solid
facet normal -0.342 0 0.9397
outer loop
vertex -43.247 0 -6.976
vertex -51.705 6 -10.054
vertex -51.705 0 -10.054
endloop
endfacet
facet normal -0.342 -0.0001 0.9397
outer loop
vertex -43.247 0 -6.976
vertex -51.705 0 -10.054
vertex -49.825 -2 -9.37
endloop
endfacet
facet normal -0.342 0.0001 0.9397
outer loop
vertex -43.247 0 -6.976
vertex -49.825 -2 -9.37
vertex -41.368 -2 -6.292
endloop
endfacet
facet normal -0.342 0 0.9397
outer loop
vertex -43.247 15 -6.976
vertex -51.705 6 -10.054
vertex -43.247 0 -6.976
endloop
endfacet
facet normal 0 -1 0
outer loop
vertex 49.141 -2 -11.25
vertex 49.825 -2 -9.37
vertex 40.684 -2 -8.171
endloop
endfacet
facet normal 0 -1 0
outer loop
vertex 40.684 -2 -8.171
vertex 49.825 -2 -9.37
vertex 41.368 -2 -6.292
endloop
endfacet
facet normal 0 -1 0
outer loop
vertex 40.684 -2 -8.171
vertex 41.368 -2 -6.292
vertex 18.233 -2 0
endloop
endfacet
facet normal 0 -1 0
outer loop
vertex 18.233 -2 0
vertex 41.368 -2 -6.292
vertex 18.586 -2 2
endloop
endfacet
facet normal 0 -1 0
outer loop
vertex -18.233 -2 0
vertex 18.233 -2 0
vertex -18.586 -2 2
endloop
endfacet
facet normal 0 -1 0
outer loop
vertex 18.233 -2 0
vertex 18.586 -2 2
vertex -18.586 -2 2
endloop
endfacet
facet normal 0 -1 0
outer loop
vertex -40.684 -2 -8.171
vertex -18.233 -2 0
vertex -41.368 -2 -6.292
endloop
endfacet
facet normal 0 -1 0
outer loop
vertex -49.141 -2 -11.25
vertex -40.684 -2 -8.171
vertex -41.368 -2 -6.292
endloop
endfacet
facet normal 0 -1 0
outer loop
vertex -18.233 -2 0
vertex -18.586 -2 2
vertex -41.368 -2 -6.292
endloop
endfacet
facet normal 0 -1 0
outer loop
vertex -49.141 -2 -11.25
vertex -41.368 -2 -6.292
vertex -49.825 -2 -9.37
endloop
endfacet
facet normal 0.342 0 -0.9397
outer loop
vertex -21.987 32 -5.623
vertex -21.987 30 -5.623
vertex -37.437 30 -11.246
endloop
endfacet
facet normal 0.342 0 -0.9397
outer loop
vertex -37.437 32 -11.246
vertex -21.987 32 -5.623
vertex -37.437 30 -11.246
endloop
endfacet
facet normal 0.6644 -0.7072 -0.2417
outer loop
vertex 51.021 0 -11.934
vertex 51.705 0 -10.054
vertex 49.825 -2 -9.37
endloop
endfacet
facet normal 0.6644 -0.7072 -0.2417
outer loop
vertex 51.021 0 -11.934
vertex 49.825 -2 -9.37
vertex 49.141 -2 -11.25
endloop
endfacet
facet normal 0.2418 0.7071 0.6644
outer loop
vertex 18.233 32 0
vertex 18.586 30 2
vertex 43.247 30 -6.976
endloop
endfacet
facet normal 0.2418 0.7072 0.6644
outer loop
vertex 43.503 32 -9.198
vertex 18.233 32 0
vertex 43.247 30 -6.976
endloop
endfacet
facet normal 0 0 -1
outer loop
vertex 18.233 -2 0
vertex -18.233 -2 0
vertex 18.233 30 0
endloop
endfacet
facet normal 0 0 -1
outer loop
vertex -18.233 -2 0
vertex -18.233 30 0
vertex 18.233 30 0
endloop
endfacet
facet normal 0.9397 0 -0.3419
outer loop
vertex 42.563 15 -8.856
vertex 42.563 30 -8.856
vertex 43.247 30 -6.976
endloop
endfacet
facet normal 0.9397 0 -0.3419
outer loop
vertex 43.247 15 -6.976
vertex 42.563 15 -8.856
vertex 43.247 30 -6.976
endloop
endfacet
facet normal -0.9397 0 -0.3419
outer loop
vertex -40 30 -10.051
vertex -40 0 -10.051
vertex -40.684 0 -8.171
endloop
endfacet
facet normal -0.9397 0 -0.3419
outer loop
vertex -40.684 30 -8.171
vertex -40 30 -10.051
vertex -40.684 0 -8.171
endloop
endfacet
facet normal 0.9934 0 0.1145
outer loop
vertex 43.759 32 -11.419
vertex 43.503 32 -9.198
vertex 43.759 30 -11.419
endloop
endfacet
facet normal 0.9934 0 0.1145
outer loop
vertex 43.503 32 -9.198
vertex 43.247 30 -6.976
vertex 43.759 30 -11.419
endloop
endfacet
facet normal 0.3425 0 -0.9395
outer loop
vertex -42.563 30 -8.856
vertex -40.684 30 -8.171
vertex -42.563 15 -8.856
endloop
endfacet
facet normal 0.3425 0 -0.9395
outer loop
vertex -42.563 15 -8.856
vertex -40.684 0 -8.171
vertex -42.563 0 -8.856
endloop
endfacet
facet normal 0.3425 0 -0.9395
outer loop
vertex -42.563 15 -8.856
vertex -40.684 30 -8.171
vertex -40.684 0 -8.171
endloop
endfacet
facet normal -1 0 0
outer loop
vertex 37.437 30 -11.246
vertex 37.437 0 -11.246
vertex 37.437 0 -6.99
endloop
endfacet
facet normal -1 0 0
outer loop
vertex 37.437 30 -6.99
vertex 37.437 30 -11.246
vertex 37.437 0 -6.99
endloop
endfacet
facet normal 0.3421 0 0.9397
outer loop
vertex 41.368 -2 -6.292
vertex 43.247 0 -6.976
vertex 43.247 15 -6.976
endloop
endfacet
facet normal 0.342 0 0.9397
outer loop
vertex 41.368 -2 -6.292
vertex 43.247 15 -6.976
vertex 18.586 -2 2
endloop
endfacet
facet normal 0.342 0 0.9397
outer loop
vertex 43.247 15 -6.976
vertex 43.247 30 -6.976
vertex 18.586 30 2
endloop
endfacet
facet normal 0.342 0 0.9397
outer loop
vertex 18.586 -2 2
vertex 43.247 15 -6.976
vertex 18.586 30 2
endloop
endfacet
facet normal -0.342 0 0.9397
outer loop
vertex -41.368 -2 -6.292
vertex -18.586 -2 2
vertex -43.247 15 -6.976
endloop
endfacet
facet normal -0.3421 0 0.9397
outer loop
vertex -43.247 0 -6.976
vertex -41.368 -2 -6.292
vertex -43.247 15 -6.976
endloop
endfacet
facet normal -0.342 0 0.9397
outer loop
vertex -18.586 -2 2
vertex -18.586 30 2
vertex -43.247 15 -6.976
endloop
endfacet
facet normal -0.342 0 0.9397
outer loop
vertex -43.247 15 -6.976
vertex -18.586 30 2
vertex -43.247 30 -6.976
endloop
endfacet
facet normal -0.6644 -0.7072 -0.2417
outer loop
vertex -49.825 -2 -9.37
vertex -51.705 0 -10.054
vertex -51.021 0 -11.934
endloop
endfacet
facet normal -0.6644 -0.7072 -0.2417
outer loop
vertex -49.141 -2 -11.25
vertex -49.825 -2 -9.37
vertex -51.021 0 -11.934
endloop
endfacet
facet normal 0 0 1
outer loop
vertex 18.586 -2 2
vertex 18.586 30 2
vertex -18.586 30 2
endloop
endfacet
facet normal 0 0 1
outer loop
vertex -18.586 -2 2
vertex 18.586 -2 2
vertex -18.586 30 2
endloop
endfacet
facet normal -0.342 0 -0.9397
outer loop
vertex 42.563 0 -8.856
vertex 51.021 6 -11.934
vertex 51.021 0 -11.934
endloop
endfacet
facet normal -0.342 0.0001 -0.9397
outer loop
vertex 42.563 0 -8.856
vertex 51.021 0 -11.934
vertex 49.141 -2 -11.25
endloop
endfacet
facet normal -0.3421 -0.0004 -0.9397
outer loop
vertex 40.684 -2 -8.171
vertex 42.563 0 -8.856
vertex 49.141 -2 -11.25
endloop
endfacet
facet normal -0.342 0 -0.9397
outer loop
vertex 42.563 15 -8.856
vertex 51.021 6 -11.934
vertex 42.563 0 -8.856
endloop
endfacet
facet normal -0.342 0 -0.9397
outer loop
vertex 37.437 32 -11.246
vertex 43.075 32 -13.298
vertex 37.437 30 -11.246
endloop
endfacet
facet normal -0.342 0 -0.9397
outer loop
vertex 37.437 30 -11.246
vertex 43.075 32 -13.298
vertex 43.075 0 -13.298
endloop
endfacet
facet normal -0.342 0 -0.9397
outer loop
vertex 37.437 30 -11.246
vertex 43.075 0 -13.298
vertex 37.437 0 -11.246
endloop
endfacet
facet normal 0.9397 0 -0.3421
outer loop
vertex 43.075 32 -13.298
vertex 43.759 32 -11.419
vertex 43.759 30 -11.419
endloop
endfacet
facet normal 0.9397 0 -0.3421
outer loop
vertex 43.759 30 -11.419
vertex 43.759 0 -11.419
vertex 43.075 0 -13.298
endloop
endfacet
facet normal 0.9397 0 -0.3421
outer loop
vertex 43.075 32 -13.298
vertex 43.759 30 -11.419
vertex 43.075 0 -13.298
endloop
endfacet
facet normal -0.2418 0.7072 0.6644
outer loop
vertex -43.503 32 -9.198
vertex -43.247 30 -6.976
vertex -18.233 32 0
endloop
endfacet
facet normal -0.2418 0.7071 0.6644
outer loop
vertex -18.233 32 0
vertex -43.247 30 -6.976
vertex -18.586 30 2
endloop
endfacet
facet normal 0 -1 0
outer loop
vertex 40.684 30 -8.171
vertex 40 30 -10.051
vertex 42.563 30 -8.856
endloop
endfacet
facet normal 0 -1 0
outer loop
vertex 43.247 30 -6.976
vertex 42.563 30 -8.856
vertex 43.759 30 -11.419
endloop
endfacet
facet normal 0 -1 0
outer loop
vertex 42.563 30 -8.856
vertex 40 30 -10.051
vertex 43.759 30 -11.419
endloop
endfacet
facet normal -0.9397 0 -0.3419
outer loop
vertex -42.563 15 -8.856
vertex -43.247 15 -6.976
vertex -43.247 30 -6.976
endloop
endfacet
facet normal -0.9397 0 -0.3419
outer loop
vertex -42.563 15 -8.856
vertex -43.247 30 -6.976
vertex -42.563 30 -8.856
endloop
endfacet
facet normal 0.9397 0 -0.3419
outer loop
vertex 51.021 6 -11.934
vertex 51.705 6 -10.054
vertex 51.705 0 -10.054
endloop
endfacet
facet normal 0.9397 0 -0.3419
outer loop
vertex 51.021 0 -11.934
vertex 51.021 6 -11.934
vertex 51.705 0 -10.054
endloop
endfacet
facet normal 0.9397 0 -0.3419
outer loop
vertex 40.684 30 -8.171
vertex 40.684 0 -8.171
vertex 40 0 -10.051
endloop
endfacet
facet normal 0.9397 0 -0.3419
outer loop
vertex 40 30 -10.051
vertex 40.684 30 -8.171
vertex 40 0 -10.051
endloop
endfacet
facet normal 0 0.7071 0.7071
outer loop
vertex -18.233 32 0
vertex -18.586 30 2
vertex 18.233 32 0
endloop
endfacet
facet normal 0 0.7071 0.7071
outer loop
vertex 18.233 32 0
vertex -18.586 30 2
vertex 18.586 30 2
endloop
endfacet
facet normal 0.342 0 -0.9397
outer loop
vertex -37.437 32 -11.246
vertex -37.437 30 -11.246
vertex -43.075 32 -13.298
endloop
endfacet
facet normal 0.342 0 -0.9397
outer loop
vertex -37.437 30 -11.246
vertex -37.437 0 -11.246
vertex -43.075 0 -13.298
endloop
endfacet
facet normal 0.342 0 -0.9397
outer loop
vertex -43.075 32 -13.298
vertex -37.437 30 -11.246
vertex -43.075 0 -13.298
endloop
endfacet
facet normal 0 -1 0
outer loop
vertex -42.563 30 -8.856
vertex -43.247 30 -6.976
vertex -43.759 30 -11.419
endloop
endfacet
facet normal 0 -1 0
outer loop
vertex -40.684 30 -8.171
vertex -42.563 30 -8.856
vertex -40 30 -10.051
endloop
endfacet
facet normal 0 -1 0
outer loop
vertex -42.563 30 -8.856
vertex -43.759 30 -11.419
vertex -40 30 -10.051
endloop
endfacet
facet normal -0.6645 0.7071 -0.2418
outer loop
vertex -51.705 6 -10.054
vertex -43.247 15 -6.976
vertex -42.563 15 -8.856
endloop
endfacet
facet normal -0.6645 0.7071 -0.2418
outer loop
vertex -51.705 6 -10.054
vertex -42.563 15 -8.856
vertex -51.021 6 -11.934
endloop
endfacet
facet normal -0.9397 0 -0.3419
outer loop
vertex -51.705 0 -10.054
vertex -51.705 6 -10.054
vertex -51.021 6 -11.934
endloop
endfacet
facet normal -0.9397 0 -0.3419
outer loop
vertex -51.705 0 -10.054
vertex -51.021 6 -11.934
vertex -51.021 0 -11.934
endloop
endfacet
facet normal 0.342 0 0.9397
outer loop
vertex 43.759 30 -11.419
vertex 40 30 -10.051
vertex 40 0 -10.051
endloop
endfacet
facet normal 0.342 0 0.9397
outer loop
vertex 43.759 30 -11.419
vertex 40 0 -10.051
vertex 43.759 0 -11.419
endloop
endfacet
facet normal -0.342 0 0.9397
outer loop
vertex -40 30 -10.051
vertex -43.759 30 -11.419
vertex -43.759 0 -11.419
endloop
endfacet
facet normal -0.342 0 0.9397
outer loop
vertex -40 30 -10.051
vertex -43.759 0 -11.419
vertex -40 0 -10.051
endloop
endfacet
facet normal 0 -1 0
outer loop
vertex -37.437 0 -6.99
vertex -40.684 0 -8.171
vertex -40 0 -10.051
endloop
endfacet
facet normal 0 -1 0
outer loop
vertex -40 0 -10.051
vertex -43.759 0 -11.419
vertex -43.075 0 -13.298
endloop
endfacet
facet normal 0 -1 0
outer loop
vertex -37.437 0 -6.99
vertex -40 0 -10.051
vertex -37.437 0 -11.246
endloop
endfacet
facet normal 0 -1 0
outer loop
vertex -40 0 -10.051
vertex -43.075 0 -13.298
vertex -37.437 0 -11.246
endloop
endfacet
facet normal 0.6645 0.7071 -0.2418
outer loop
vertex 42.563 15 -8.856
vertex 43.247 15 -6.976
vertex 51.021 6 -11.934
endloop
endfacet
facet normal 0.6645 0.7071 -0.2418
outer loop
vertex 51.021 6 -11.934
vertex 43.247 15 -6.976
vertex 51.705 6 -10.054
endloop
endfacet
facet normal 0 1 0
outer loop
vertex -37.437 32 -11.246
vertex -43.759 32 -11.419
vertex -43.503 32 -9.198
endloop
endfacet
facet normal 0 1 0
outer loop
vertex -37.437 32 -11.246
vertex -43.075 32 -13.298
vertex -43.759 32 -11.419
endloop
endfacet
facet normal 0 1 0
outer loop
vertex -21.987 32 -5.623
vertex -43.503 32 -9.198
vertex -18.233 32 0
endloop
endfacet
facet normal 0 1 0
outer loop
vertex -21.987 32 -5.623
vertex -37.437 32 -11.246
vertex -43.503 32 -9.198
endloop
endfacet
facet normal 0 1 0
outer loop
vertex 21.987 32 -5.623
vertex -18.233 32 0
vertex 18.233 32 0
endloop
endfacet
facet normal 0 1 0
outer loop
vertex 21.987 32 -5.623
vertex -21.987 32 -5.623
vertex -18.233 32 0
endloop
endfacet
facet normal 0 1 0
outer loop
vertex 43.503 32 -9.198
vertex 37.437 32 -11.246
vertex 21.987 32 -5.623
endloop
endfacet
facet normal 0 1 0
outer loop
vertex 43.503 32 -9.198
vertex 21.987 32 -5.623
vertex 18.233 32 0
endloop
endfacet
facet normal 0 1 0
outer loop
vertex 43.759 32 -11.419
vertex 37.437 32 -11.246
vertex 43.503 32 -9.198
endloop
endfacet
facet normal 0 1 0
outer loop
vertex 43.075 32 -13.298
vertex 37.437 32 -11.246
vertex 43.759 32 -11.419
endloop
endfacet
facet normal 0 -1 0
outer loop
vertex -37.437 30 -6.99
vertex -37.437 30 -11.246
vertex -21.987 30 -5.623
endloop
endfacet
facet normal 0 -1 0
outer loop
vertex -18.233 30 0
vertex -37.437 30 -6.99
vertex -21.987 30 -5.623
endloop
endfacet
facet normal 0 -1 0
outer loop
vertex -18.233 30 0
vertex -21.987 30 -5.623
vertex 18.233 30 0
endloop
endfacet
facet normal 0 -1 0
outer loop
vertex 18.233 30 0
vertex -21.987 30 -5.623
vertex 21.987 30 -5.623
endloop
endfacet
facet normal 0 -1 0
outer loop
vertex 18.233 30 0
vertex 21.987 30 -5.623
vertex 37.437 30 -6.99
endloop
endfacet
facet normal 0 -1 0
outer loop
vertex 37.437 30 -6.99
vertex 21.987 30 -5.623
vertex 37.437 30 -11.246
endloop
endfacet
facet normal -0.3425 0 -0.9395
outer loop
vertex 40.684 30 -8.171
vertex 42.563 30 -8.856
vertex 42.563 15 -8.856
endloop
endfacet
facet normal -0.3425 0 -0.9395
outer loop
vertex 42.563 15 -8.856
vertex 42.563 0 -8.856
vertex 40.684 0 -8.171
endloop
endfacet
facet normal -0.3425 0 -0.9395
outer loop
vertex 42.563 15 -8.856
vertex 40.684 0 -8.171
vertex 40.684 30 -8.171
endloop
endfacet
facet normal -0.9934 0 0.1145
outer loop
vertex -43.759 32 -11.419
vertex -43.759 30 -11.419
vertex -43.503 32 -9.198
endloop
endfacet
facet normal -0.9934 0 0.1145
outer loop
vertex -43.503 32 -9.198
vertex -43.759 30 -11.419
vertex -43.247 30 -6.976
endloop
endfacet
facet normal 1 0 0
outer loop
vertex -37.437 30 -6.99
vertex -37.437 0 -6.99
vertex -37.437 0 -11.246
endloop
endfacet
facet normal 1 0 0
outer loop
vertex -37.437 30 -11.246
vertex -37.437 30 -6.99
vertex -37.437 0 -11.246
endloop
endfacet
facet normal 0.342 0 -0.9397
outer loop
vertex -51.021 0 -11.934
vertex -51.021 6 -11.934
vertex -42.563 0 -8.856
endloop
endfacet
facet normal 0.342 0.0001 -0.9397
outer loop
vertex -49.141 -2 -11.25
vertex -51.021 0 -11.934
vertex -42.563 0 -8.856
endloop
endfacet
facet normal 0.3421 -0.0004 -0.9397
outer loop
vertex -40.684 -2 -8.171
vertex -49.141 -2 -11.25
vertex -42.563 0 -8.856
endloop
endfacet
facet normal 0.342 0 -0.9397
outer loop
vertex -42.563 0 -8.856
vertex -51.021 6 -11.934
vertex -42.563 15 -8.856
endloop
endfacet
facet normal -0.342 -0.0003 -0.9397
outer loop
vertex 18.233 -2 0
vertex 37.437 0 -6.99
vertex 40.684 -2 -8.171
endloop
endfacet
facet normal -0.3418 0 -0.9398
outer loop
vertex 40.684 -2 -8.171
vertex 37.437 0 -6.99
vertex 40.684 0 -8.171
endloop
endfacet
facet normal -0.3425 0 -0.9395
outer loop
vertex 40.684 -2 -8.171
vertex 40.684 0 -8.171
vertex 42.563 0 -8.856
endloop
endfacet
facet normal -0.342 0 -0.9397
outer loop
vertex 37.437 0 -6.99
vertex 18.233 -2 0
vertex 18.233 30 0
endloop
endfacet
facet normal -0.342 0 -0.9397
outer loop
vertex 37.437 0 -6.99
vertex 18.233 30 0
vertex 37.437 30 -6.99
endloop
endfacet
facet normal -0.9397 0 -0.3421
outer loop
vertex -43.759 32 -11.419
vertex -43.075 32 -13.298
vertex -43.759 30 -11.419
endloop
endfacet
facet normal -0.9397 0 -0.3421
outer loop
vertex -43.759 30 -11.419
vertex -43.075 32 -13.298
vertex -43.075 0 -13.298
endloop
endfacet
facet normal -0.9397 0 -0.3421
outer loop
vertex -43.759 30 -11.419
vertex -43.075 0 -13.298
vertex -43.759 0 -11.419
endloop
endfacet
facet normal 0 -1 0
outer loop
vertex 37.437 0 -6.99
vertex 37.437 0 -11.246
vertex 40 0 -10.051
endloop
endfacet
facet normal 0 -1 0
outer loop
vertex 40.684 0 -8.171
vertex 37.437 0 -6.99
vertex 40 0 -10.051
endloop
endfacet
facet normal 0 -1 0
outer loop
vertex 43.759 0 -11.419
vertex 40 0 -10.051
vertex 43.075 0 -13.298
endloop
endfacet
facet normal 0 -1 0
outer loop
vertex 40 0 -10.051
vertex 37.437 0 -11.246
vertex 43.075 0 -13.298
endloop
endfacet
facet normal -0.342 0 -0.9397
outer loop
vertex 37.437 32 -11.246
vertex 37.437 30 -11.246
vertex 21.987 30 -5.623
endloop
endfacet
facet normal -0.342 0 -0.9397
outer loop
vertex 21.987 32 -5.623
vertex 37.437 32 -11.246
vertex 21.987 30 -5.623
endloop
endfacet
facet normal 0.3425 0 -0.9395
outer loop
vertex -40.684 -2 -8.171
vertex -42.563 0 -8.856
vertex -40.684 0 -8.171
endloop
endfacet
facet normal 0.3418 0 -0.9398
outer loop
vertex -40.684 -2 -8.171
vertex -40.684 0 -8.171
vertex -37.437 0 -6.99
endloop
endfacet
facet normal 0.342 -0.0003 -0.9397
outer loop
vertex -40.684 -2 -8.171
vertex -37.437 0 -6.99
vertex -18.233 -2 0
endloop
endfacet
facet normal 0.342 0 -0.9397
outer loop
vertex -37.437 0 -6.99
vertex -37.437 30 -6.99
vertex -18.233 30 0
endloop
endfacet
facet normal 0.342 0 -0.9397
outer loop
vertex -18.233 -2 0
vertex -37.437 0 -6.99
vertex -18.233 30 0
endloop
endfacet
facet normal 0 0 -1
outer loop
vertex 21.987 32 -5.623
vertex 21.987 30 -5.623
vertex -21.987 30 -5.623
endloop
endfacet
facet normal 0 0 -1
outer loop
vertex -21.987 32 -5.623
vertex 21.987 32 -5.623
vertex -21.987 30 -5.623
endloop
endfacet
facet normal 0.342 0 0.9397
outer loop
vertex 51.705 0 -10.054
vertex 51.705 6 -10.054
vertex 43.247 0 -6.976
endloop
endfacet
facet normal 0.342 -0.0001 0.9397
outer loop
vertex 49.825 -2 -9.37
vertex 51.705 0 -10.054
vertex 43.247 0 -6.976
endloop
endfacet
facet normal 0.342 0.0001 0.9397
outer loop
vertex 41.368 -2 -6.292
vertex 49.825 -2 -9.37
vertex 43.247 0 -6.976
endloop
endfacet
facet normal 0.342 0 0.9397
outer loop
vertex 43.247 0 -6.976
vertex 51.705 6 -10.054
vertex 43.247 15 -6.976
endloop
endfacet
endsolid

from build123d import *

# Parameters (mm, degrees)
BOSS_EXTRUDE5_DEPTH = 30
BOSS_EXTRUDE6_DEPTH = 2
BOSS_EXTRUDE7_DEPTH = 2
CHAMFER2_SIZE       = 2
CHAMFER3_SIZE       = 2
BOSS_EXTRUDE8_DEPTH = 2
BOSS_EXTRUDE9_DEPTH = 2
CHAMFER4_SIZE       = 2


with BuildPart() as part:
    # Sketch5 → Boss-Extrude5 (new body)
    with BuildSketch(Plane(origin=(0, 0, 0), x_dir=(1, 0, 0), z_dir=(0, 1, 0))):
        Polygon((-40, 10.050874286), (-40.684040287, 8.171489044), (-42.563425528, 8.855529331), (-43.247465815, 6.976144089), (-18.585712616, -2), (18.585712616, -2), (43.247465815, 6.976144089), (42.563425528, 8.855529331), (40.684040287, 8.171489044), (40, 10.050874286), (43.758770483, 11.418954859), (43.074730196, 13.2983401), (37.436574472, 11.24621924), (37.436574472, 6.989508151), (18.233058655, 0), (-18.233058655, 0), (-37.436574472, 6.989508151), (-37.436574472, 11.24621924), (-43.074730196, 13.2983401), (-43.758770483, 11.418954859), align=None)
    extrude(amount=BOSS_EXTRUDE5_DEPTH)

    # Sketch6 → Boss-Extrude6 (add)
    with BuildSketch(Plane(origin=(0, 30, 0), x_dir=(1, 0, 0), z_dir=(0, 1, 0))):
        Polygon((-43.758770483, 11.418954859), (-43.247465815, 6.976144089), (-18.585712616, -2), (18.585712616, -2), (43.247465815, 6.976144089), (43.758770483, 11.418954859), (43.074730196, 13.2983401), (37.436574472, 11.24621924), (21.987207763, 5.62310962), (-21.987207763, 5.62310962), (-37.436574472, 11.24621924), (-43.074730196, 13.2983401), align=None)
    extrude(amount=BOSS_EXTRUDE6_DEPTH)

    # Sketch7 → Boss-Extrude7 (add)
    with BuildSketch(Plane.XZ):
        Polygon((-43.247465815, -6.976144089), (-42.563425528, -8.855529331), (-18.233058655, 0), (18.233058655, 0), (42.563425528, -8.855529331), (43.247465815, -6.976144089), (18.585712616, 2), (-18.585712616, 2), align=None)
    extrude(amount=BOSS_EXTRUDE7_DEPTH)

    # Chamfer2
    chamfer2_edges = [part.edges().sort_by_distance(p)[0] for p in [
        (30.916589216, 32, -2.488072045),
        (0, 32, 2),
        (-30.916589216, 32, -2.488072045),
    ]]
    chamfer(chamfer2_edges, length=CHAMFER2_SIZE)

    # Chamfer3
    chamfer3_edges = [part.edges().sort_by_distance(p)[0] for p in [
        (-42.905445672, -2, -7.91583671),
        (42.905445672, -2, -7.91583671),
    ]]
    chamfer(chamfer3_edges, length=CHAMFER3_SIZE)

    # Sketch10 → Boss-Extrude8 (add)
    with BuildSketch(Plane(origin=(-2.816902982, 0, 7.739377337), x_dir=(0.9396926207859265, 0, 0.34202014332561875), z_dir=(-0.34202014332561875, 0, 0.9396926207859265))):
        Polygon((-41.025306295, -2), (-43.025306295, 0), (-43.025306295, 15), (-52.025306295, 6), (-52.025306295, -2), align=None)
    extrude(amount=-BOSS_EXTRUDE8_DEPTH)

    # Sketch11 → Boss-Extrude9 (add)
    with BuildSketch(Plane(origin=(2.816902982, 0, 7.739377337), x_dir=(0.9396926207859748, 0, -0.342020143325486), z_dir=(0.3420201433254861, 0, 0.9396926207859749))):
        Polygon((41.025306295, -2), (43.025306295, 0), (43.025306295, 15), (52.025306295, 6), (52.025306295, -2), align=None)
    extrude(amount=-BOSS_EXTRUDE9_DEPTH)

    # Chamfer4
    chamfer4_edges = [part.edges().sort_by_distance(p)[0] for p in [
        (-51.362679259, -2, -10.994018),
        (51.362679259, -2, -10.994018),
    ]]
    chamfer(chamfer4_edges, length=CHAMFER4_SIZE)


solid = part.part
